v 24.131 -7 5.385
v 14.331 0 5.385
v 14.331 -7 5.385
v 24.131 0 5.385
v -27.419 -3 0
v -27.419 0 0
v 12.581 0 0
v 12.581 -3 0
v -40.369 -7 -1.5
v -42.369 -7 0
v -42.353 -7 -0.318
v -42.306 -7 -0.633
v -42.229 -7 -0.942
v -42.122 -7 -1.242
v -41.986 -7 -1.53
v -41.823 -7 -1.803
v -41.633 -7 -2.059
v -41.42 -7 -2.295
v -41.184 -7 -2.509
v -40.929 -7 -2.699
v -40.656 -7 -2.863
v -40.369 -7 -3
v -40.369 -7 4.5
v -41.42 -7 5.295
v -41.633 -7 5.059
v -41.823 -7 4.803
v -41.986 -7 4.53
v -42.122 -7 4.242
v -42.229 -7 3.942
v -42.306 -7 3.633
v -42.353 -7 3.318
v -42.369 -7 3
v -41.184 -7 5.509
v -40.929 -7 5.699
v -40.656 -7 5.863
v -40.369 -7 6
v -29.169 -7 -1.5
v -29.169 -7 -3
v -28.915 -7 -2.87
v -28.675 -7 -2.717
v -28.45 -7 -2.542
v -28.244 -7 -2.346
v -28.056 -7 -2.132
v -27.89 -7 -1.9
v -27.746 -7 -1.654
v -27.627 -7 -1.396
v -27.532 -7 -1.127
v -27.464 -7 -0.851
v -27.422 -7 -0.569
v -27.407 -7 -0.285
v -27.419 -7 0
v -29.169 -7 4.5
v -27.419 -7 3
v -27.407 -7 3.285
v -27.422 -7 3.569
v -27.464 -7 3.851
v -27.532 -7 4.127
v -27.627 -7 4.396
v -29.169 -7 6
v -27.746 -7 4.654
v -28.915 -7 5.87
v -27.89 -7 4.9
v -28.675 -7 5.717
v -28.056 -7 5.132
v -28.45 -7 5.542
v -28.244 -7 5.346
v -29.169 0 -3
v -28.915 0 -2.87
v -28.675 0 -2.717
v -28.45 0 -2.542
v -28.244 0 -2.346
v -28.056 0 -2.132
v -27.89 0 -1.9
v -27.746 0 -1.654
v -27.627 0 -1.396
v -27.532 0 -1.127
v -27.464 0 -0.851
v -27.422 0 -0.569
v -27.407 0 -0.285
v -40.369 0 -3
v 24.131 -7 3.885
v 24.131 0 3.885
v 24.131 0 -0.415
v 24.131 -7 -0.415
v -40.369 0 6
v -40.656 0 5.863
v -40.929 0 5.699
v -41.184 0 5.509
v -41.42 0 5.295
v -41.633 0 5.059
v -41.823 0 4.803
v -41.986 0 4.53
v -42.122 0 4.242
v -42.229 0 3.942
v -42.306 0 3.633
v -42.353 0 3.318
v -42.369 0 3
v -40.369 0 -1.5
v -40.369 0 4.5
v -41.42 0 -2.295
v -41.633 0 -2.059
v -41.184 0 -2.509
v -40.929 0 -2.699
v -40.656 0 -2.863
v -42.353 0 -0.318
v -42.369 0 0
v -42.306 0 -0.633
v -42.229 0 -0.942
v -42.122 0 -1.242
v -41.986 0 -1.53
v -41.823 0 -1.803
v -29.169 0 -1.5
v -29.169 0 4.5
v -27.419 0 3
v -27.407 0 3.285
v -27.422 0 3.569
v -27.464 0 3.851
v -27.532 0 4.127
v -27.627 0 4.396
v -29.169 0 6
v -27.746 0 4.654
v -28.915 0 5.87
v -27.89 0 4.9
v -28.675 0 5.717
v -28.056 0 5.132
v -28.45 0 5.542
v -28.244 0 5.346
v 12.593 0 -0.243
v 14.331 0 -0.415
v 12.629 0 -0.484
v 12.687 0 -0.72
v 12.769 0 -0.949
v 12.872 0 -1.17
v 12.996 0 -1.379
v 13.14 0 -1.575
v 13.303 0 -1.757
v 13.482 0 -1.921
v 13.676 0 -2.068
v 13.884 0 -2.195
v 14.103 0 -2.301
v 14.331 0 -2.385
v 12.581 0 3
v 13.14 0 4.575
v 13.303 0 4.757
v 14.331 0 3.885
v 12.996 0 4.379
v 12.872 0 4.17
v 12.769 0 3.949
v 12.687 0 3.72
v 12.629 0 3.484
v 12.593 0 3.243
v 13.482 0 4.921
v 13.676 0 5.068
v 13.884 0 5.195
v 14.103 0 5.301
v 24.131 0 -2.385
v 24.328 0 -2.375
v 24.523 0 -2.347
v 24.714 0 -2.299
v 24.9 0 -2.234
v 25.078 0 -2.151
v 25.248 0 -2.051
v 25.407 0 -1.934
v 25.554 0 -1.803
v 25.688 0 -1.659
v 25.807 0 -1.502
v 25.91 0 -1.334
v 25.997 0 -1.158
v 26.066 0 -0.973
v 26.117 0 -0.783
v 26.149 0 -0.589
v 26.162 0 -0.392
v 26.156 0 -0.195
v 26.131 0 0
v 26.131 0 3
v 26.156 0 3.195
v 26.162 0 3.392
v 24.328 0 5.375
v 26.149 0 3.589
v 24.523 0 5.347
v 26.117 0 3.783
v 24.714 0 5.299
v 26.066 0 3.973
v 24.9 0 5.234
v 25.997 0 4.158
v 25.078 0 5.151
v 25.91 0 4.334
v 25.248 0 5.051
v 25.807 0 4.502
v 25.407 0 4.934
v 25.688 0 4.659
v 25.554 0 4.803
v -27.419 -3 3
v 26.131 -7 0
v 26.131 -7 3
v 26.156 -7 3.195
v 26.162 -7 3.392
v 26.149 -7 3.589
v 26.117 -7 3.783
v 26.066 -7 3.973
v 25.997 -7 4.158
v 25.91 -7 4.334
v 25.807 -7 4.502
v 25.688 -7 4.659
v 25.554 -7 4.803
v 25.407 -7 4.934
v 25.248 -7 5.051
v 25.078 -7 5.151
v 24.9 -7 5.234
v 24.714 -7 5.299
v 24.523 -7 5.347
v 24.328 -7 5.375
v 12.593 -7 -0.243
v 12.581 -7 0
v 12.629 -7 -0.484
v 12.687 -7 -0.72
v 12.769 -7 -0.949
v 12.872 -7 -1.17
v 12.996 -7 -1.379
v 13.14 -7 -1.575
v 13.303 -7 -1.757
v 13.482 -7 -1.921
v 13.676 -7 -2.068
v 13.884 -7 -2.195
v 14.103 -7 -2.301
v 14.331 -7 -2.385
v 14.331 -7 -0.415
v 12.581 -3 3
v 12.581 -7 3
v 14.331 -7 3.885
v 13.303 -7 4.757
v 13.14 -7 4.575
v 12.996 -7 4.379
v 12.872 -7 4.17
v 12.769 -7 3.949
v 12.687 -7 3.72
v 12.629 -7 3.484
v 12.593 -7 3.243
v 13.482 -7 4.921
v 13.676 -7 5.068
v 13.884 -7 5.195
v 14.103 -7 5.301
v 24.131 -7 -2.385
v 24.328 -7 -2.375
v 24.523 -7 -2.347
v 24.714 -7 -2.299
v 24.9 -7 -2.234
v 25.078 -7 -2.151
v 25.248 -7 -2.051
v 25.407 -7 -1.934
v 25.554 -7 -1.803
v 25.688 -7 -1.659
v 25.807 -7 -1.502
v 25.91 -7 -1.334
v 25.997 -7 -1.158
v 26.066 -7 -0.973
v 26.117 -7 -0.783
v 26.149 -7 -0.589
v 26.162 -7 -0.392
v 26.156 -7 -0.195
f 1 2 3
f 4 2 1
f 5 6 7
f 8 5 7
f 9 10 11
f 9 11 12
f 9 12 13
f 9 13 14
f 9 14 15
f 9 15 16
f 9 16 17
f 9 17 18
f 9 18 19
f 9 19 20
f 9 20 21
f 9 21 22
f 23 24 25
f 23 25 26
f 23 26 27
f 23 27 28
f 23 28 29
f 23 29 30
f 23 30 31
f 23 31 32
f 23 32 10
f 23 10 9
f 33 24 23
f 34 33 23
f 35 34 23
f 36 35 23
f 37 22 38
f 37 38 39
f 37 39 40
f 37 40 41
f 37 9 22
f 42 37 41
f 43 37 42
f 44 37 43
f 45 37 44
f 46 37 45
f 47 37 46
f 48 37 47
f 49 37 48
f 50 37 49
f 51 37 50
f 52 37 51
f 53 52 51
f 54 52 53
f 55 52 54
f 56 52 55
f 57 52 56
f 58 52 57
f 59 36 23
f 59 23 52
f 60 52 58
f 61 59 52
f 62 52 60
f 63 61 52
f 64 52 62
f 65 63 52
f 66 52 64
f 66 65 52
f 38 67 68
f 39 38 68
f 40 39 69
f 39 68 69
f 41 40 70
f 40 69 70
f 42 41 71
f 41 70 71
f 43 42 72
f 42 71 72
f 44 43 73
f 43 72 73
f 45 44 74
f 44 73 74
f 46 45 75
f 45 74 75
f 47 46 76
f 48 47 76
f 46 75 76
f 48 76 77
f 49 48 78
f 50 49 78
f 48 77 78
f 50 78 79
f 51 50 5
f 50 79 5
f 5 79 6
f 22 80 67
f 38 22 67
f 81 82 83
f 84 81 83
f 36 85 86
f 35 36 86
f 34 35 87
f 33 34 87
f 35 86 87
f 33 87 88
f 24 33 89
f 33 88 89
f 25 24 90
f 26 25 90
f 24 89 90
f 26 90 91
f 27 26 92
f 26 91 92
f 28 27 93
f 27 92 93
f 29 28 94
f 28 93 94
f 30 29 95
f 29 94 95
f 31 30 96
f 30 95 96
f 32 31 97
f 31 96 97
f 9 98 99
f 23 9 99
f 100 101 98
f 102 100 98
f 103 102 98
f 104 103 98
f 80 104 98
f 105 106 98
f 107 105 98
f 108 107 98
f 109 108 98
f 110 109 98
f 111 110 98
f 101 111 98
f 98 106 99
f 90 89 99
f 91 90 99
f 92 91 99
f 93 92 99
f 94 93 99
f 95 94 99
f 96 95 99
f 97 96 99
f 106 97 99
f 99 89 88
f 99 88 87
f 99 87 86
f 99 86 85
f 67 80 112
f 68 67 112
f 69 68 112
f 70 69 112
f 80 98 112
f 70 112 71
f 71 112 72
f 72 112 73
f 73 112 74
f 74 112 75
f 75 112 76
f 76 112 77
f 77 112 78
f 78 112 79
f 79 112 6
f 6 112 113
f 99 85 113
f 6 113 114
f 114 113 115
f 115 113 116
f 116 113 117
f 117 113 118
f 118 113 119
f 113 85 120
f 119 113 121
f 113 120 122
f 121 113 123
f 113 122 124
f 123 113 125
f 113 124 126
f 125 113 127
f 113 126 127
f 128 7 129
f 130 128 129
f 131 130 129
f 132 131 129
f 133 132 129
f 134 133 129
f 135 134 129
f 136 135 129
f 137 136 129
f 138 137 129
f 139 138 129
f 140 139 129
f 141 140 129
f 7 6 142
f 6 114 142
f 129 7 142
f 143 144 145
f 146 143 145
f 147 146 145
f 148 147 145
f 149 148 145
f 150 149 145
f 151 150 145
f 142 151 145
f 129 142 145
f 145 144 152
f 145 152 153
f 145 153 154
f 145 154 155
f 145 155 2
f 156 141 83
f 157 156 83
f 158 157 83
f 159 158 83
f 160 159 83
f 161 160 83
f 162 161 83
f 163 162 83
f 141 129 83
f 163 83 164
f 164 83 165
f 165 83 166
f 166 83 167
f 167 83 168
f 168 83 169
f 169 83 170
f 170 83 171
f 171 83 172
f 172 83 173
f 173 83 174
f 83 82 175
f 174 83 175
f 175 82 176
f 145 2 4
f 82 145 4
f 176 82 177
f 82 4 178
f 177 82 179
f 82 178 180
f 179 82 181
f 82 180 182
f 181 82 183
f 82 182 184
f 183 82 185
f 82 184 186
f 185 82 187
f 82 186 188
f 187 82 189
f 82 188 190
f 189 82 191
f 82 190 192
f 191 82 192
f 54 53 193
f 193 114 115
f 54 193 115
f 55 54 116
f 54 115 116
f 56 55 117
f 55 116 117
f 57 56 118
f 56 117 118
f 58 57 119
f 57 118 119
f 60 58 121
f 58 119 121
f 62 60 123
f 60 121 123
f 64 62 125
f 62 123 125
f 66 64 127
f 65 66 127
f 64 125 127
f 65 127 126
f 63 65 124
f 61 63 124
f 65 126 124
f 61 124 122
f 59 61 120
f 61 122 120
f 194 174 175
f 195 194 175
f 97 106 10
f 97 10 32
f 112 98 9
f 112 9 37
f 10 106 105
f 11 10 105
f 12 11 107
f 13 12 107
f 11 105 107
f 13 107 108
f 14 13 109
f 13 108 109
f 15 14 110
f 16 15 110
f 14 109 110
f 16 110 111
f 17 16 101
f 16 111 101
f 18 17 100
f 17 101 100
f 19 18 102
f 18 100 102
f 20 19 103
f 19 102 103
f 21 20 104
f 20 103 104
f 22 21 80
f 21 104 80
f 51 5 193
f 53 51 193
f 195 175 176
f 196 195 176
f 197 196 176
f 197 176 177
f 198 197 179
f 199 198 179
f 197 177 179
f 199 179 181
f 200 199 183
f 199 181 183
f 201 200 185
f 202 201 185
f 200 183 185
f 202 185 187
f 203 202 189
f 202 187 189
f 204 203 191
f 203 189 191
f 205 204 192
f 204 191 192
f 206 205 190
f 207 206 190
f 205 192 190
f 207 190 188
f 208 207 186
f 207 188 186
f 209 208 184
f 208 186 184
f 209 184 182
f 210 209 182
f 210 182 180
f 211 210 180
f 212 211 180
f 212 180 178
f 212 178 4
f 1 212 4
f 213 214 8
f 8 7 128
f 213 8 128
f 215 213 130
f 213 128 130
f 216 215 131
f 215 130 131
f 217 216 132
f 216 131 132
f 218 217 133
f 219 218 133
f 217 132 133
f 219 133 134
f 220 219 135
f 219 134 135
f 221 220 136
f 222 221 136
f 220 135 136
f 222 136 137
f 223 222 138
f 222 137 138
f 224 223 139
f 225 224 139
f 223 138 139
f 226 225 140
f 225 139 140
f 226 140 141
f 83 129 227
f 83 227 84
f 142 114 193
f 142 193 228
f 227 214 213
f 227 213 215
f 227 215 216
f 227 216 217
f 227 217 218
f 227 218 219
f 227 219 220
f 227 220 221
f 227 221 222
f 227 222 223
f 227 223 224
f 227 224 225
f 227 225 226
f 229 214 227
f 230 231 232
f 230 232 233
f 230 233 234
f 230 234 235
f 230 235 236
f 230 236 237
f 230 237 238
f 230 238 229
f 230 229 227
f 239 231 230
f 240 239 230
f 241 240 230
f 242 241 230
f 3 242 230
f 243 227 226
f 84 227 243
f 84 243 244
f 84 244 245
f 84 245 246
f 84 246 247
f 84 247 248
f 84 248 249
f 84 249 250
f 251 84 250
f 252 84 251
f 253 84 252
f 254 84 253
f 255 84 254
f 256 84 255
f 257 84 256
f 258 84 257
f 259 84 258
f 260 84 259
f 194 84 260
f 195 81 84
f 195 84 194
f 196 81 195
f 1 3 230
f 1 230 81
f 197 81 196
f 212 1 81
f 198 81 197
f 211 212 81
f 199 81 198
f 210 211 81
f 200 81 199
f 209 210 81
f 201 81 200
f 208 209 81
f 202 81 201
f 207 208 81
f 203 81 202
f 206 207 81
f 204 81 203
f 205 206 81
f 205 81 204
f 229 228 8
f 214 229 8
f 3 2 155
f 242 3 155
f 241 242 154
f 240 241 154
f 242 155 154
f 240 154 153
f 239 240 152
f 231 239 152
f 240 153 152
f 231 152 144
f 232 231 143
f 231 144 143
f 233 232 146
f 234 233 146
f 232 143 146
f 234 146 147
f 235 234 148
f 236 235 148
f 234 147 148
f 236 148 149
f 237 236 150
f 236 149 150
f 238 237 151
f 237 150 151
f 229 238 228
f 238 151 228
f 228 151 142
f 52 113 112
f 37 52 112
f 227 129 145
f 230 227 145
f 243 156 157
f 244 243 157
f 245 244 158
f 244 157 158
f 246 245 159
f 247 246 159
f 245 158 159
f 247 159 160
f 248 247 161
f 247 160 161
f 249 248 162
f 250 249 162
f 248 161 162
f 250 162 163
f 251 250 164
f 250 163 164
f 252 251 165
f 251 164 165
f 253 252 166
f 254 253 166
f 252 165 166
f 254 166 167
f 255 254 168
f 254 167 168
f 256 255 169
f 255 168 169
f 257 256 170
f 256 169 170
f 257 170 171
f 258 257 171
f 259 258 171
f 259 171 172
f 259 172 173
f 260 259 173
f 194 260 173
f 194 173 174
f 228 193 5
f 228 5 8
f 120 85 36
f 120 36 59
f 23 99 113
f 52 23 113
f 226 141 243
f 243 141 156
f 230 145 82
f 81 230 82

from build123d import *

# Parameters (mm, degrees)
F0_W     = 0.75
F0_H     = 3
F0_W_2   = 11.2
F0_H_2   = 1.5
F1_DEPTH = 7
F0_W_3   = 40
F2_DEPTH = 3
F0_W_4   = 9.8
F0_H_3   = 1.969696
F3_DEPTH = 7


with BuildPart() as f1:
    # F0 (on Front) → F1 (new body)
    with BuildSketch(Plane.XZ):
        with BuildLine():
            Line((-40.368542, 4.5), (-40.368542, 6))
            ThreePointArc((-40.368542, 6), (-41.822706, 4.802776), (-42.368542, 3))
            Line((-42.368542, 3), (-41.618542, 3))
            ThreePointArc((-41.618542, 3), (-41.166325, 3.893986), (-40.368542, 4.5))
        make_face()
        with Locations((-41.993542, 1.5)):
            Rectangle(F0_W, F0_H)
        with BuildLine():
            ThreePointArc((-42.368542, 0), (-41.822706, -1.802776), (-40.368542, -3))
            Line((-40.368542, -3), (-40.368542, -1.5))
            ThreePointArc((-40.368542, -1.5), (-41.162473, -0.890775), (-41.618542, 0))
            Line((-41.618542, 0), (-42.368542, 0))
        make_face()
        with Locations((-34.768542, -2.25)):
            Rectangle(F0_W_2, F0_H_2)
        with BuildLine():
            ThreePointArc((-29.168542, -3), (-27.815266, -1.778994), (-27.418542, 0))
            Line((-27.418542, 0), (-27.418542, 3))
            ThreePointArc((-27.418542, 3), (-27.815266, 4.778994), (-29.168542, 6))
            Line((-29.168542, 6), (-29.168542, 4.5))
            Line((-29.168542, 4.5), (-29.168542, -1.5))
            Line((-29.168542, -1.5), (-29.168542, -3))
        make_face()
        with Locations((-34.768542, 5.25)):
            Rectangle(F0_W_2, F0_H_2)
        with BuildLine():
            ThreePointArc((-41.618542, 0), (-41.162473, -0.890775), (-40.368542, -1.5))
            Line((-40.368542, -1.5), (-40.368542, 4.5))
            ThreePointArc((-40.368542, 4.5), (-41.166325, 3.893986), (-41.618542, 3))
            Line((-41.618542, 3), (-41.618542, 0))
        make_face()
    extrude(amount=F1_DEPTH)

    # F0 (on Front) → F2 (join)
    with BuildSketch(Plane.XZ):
        with Locations((-7.418542, 1.5)):
            Rectangle(F0_W_3, F0_H)
    extrude(amount=F2_DEPTH)

    # F0 (on Front) → F3 (join)
    with BuildSketch(Plane.XZ):
        with BuildLine():
            Line((12.581458, 3), (12.581458, 0))
            ThreePointArc((12.581458, 0), (13.065893, -1.47902), (14.331458, -2.384848))
            Line((14.331458, -2.384848), (14.331458, -0.415152))
            Line((14.331458, -0.415152), (14.331458, 3.884848))
            Line((14.331458, 3.884848), (14.331458, 5.384848))
            ThreePointArc((14.331458, 5.384848), (13.065893, 4.47902), (12.581458, 3))
        make_face()
        with Locations((19.231458, -1.4)):
            Rectangle(F0_W_4, F0_H_3)
        with BuildLine():
            Line((24.131458, -0.415152), (24.131458, -2.384848))
            ThreePointArc((24.131458, -2.384848), (25.687695, -1.6589), (26.131458, 0))
            Line((26.131458, 0), (25.381458, 0))
            Line((25.381458, 0), (25.381458, 3))
            Line((25.381458, 3), (26.131458, 3))
            ThreePointArc((26.131458, 3), (25.687695, 4.6589), (24.131458, 5.384848))
            Line((24.131458, 5.384848), (24.131458, 3.884848))
            Line((24.131458, 3.884848), (24.131458, -0.415152))
        make_face()
        with Locations((25.756458, 1.5)):
            Rectangle(F0_W, F0_H)
        with Locations((19.231458, 4.634848)):
            Rectangle(F0_W_4, F0_H_2)
    extrude(amount=F3_DEPTH)


solid = f1.part
